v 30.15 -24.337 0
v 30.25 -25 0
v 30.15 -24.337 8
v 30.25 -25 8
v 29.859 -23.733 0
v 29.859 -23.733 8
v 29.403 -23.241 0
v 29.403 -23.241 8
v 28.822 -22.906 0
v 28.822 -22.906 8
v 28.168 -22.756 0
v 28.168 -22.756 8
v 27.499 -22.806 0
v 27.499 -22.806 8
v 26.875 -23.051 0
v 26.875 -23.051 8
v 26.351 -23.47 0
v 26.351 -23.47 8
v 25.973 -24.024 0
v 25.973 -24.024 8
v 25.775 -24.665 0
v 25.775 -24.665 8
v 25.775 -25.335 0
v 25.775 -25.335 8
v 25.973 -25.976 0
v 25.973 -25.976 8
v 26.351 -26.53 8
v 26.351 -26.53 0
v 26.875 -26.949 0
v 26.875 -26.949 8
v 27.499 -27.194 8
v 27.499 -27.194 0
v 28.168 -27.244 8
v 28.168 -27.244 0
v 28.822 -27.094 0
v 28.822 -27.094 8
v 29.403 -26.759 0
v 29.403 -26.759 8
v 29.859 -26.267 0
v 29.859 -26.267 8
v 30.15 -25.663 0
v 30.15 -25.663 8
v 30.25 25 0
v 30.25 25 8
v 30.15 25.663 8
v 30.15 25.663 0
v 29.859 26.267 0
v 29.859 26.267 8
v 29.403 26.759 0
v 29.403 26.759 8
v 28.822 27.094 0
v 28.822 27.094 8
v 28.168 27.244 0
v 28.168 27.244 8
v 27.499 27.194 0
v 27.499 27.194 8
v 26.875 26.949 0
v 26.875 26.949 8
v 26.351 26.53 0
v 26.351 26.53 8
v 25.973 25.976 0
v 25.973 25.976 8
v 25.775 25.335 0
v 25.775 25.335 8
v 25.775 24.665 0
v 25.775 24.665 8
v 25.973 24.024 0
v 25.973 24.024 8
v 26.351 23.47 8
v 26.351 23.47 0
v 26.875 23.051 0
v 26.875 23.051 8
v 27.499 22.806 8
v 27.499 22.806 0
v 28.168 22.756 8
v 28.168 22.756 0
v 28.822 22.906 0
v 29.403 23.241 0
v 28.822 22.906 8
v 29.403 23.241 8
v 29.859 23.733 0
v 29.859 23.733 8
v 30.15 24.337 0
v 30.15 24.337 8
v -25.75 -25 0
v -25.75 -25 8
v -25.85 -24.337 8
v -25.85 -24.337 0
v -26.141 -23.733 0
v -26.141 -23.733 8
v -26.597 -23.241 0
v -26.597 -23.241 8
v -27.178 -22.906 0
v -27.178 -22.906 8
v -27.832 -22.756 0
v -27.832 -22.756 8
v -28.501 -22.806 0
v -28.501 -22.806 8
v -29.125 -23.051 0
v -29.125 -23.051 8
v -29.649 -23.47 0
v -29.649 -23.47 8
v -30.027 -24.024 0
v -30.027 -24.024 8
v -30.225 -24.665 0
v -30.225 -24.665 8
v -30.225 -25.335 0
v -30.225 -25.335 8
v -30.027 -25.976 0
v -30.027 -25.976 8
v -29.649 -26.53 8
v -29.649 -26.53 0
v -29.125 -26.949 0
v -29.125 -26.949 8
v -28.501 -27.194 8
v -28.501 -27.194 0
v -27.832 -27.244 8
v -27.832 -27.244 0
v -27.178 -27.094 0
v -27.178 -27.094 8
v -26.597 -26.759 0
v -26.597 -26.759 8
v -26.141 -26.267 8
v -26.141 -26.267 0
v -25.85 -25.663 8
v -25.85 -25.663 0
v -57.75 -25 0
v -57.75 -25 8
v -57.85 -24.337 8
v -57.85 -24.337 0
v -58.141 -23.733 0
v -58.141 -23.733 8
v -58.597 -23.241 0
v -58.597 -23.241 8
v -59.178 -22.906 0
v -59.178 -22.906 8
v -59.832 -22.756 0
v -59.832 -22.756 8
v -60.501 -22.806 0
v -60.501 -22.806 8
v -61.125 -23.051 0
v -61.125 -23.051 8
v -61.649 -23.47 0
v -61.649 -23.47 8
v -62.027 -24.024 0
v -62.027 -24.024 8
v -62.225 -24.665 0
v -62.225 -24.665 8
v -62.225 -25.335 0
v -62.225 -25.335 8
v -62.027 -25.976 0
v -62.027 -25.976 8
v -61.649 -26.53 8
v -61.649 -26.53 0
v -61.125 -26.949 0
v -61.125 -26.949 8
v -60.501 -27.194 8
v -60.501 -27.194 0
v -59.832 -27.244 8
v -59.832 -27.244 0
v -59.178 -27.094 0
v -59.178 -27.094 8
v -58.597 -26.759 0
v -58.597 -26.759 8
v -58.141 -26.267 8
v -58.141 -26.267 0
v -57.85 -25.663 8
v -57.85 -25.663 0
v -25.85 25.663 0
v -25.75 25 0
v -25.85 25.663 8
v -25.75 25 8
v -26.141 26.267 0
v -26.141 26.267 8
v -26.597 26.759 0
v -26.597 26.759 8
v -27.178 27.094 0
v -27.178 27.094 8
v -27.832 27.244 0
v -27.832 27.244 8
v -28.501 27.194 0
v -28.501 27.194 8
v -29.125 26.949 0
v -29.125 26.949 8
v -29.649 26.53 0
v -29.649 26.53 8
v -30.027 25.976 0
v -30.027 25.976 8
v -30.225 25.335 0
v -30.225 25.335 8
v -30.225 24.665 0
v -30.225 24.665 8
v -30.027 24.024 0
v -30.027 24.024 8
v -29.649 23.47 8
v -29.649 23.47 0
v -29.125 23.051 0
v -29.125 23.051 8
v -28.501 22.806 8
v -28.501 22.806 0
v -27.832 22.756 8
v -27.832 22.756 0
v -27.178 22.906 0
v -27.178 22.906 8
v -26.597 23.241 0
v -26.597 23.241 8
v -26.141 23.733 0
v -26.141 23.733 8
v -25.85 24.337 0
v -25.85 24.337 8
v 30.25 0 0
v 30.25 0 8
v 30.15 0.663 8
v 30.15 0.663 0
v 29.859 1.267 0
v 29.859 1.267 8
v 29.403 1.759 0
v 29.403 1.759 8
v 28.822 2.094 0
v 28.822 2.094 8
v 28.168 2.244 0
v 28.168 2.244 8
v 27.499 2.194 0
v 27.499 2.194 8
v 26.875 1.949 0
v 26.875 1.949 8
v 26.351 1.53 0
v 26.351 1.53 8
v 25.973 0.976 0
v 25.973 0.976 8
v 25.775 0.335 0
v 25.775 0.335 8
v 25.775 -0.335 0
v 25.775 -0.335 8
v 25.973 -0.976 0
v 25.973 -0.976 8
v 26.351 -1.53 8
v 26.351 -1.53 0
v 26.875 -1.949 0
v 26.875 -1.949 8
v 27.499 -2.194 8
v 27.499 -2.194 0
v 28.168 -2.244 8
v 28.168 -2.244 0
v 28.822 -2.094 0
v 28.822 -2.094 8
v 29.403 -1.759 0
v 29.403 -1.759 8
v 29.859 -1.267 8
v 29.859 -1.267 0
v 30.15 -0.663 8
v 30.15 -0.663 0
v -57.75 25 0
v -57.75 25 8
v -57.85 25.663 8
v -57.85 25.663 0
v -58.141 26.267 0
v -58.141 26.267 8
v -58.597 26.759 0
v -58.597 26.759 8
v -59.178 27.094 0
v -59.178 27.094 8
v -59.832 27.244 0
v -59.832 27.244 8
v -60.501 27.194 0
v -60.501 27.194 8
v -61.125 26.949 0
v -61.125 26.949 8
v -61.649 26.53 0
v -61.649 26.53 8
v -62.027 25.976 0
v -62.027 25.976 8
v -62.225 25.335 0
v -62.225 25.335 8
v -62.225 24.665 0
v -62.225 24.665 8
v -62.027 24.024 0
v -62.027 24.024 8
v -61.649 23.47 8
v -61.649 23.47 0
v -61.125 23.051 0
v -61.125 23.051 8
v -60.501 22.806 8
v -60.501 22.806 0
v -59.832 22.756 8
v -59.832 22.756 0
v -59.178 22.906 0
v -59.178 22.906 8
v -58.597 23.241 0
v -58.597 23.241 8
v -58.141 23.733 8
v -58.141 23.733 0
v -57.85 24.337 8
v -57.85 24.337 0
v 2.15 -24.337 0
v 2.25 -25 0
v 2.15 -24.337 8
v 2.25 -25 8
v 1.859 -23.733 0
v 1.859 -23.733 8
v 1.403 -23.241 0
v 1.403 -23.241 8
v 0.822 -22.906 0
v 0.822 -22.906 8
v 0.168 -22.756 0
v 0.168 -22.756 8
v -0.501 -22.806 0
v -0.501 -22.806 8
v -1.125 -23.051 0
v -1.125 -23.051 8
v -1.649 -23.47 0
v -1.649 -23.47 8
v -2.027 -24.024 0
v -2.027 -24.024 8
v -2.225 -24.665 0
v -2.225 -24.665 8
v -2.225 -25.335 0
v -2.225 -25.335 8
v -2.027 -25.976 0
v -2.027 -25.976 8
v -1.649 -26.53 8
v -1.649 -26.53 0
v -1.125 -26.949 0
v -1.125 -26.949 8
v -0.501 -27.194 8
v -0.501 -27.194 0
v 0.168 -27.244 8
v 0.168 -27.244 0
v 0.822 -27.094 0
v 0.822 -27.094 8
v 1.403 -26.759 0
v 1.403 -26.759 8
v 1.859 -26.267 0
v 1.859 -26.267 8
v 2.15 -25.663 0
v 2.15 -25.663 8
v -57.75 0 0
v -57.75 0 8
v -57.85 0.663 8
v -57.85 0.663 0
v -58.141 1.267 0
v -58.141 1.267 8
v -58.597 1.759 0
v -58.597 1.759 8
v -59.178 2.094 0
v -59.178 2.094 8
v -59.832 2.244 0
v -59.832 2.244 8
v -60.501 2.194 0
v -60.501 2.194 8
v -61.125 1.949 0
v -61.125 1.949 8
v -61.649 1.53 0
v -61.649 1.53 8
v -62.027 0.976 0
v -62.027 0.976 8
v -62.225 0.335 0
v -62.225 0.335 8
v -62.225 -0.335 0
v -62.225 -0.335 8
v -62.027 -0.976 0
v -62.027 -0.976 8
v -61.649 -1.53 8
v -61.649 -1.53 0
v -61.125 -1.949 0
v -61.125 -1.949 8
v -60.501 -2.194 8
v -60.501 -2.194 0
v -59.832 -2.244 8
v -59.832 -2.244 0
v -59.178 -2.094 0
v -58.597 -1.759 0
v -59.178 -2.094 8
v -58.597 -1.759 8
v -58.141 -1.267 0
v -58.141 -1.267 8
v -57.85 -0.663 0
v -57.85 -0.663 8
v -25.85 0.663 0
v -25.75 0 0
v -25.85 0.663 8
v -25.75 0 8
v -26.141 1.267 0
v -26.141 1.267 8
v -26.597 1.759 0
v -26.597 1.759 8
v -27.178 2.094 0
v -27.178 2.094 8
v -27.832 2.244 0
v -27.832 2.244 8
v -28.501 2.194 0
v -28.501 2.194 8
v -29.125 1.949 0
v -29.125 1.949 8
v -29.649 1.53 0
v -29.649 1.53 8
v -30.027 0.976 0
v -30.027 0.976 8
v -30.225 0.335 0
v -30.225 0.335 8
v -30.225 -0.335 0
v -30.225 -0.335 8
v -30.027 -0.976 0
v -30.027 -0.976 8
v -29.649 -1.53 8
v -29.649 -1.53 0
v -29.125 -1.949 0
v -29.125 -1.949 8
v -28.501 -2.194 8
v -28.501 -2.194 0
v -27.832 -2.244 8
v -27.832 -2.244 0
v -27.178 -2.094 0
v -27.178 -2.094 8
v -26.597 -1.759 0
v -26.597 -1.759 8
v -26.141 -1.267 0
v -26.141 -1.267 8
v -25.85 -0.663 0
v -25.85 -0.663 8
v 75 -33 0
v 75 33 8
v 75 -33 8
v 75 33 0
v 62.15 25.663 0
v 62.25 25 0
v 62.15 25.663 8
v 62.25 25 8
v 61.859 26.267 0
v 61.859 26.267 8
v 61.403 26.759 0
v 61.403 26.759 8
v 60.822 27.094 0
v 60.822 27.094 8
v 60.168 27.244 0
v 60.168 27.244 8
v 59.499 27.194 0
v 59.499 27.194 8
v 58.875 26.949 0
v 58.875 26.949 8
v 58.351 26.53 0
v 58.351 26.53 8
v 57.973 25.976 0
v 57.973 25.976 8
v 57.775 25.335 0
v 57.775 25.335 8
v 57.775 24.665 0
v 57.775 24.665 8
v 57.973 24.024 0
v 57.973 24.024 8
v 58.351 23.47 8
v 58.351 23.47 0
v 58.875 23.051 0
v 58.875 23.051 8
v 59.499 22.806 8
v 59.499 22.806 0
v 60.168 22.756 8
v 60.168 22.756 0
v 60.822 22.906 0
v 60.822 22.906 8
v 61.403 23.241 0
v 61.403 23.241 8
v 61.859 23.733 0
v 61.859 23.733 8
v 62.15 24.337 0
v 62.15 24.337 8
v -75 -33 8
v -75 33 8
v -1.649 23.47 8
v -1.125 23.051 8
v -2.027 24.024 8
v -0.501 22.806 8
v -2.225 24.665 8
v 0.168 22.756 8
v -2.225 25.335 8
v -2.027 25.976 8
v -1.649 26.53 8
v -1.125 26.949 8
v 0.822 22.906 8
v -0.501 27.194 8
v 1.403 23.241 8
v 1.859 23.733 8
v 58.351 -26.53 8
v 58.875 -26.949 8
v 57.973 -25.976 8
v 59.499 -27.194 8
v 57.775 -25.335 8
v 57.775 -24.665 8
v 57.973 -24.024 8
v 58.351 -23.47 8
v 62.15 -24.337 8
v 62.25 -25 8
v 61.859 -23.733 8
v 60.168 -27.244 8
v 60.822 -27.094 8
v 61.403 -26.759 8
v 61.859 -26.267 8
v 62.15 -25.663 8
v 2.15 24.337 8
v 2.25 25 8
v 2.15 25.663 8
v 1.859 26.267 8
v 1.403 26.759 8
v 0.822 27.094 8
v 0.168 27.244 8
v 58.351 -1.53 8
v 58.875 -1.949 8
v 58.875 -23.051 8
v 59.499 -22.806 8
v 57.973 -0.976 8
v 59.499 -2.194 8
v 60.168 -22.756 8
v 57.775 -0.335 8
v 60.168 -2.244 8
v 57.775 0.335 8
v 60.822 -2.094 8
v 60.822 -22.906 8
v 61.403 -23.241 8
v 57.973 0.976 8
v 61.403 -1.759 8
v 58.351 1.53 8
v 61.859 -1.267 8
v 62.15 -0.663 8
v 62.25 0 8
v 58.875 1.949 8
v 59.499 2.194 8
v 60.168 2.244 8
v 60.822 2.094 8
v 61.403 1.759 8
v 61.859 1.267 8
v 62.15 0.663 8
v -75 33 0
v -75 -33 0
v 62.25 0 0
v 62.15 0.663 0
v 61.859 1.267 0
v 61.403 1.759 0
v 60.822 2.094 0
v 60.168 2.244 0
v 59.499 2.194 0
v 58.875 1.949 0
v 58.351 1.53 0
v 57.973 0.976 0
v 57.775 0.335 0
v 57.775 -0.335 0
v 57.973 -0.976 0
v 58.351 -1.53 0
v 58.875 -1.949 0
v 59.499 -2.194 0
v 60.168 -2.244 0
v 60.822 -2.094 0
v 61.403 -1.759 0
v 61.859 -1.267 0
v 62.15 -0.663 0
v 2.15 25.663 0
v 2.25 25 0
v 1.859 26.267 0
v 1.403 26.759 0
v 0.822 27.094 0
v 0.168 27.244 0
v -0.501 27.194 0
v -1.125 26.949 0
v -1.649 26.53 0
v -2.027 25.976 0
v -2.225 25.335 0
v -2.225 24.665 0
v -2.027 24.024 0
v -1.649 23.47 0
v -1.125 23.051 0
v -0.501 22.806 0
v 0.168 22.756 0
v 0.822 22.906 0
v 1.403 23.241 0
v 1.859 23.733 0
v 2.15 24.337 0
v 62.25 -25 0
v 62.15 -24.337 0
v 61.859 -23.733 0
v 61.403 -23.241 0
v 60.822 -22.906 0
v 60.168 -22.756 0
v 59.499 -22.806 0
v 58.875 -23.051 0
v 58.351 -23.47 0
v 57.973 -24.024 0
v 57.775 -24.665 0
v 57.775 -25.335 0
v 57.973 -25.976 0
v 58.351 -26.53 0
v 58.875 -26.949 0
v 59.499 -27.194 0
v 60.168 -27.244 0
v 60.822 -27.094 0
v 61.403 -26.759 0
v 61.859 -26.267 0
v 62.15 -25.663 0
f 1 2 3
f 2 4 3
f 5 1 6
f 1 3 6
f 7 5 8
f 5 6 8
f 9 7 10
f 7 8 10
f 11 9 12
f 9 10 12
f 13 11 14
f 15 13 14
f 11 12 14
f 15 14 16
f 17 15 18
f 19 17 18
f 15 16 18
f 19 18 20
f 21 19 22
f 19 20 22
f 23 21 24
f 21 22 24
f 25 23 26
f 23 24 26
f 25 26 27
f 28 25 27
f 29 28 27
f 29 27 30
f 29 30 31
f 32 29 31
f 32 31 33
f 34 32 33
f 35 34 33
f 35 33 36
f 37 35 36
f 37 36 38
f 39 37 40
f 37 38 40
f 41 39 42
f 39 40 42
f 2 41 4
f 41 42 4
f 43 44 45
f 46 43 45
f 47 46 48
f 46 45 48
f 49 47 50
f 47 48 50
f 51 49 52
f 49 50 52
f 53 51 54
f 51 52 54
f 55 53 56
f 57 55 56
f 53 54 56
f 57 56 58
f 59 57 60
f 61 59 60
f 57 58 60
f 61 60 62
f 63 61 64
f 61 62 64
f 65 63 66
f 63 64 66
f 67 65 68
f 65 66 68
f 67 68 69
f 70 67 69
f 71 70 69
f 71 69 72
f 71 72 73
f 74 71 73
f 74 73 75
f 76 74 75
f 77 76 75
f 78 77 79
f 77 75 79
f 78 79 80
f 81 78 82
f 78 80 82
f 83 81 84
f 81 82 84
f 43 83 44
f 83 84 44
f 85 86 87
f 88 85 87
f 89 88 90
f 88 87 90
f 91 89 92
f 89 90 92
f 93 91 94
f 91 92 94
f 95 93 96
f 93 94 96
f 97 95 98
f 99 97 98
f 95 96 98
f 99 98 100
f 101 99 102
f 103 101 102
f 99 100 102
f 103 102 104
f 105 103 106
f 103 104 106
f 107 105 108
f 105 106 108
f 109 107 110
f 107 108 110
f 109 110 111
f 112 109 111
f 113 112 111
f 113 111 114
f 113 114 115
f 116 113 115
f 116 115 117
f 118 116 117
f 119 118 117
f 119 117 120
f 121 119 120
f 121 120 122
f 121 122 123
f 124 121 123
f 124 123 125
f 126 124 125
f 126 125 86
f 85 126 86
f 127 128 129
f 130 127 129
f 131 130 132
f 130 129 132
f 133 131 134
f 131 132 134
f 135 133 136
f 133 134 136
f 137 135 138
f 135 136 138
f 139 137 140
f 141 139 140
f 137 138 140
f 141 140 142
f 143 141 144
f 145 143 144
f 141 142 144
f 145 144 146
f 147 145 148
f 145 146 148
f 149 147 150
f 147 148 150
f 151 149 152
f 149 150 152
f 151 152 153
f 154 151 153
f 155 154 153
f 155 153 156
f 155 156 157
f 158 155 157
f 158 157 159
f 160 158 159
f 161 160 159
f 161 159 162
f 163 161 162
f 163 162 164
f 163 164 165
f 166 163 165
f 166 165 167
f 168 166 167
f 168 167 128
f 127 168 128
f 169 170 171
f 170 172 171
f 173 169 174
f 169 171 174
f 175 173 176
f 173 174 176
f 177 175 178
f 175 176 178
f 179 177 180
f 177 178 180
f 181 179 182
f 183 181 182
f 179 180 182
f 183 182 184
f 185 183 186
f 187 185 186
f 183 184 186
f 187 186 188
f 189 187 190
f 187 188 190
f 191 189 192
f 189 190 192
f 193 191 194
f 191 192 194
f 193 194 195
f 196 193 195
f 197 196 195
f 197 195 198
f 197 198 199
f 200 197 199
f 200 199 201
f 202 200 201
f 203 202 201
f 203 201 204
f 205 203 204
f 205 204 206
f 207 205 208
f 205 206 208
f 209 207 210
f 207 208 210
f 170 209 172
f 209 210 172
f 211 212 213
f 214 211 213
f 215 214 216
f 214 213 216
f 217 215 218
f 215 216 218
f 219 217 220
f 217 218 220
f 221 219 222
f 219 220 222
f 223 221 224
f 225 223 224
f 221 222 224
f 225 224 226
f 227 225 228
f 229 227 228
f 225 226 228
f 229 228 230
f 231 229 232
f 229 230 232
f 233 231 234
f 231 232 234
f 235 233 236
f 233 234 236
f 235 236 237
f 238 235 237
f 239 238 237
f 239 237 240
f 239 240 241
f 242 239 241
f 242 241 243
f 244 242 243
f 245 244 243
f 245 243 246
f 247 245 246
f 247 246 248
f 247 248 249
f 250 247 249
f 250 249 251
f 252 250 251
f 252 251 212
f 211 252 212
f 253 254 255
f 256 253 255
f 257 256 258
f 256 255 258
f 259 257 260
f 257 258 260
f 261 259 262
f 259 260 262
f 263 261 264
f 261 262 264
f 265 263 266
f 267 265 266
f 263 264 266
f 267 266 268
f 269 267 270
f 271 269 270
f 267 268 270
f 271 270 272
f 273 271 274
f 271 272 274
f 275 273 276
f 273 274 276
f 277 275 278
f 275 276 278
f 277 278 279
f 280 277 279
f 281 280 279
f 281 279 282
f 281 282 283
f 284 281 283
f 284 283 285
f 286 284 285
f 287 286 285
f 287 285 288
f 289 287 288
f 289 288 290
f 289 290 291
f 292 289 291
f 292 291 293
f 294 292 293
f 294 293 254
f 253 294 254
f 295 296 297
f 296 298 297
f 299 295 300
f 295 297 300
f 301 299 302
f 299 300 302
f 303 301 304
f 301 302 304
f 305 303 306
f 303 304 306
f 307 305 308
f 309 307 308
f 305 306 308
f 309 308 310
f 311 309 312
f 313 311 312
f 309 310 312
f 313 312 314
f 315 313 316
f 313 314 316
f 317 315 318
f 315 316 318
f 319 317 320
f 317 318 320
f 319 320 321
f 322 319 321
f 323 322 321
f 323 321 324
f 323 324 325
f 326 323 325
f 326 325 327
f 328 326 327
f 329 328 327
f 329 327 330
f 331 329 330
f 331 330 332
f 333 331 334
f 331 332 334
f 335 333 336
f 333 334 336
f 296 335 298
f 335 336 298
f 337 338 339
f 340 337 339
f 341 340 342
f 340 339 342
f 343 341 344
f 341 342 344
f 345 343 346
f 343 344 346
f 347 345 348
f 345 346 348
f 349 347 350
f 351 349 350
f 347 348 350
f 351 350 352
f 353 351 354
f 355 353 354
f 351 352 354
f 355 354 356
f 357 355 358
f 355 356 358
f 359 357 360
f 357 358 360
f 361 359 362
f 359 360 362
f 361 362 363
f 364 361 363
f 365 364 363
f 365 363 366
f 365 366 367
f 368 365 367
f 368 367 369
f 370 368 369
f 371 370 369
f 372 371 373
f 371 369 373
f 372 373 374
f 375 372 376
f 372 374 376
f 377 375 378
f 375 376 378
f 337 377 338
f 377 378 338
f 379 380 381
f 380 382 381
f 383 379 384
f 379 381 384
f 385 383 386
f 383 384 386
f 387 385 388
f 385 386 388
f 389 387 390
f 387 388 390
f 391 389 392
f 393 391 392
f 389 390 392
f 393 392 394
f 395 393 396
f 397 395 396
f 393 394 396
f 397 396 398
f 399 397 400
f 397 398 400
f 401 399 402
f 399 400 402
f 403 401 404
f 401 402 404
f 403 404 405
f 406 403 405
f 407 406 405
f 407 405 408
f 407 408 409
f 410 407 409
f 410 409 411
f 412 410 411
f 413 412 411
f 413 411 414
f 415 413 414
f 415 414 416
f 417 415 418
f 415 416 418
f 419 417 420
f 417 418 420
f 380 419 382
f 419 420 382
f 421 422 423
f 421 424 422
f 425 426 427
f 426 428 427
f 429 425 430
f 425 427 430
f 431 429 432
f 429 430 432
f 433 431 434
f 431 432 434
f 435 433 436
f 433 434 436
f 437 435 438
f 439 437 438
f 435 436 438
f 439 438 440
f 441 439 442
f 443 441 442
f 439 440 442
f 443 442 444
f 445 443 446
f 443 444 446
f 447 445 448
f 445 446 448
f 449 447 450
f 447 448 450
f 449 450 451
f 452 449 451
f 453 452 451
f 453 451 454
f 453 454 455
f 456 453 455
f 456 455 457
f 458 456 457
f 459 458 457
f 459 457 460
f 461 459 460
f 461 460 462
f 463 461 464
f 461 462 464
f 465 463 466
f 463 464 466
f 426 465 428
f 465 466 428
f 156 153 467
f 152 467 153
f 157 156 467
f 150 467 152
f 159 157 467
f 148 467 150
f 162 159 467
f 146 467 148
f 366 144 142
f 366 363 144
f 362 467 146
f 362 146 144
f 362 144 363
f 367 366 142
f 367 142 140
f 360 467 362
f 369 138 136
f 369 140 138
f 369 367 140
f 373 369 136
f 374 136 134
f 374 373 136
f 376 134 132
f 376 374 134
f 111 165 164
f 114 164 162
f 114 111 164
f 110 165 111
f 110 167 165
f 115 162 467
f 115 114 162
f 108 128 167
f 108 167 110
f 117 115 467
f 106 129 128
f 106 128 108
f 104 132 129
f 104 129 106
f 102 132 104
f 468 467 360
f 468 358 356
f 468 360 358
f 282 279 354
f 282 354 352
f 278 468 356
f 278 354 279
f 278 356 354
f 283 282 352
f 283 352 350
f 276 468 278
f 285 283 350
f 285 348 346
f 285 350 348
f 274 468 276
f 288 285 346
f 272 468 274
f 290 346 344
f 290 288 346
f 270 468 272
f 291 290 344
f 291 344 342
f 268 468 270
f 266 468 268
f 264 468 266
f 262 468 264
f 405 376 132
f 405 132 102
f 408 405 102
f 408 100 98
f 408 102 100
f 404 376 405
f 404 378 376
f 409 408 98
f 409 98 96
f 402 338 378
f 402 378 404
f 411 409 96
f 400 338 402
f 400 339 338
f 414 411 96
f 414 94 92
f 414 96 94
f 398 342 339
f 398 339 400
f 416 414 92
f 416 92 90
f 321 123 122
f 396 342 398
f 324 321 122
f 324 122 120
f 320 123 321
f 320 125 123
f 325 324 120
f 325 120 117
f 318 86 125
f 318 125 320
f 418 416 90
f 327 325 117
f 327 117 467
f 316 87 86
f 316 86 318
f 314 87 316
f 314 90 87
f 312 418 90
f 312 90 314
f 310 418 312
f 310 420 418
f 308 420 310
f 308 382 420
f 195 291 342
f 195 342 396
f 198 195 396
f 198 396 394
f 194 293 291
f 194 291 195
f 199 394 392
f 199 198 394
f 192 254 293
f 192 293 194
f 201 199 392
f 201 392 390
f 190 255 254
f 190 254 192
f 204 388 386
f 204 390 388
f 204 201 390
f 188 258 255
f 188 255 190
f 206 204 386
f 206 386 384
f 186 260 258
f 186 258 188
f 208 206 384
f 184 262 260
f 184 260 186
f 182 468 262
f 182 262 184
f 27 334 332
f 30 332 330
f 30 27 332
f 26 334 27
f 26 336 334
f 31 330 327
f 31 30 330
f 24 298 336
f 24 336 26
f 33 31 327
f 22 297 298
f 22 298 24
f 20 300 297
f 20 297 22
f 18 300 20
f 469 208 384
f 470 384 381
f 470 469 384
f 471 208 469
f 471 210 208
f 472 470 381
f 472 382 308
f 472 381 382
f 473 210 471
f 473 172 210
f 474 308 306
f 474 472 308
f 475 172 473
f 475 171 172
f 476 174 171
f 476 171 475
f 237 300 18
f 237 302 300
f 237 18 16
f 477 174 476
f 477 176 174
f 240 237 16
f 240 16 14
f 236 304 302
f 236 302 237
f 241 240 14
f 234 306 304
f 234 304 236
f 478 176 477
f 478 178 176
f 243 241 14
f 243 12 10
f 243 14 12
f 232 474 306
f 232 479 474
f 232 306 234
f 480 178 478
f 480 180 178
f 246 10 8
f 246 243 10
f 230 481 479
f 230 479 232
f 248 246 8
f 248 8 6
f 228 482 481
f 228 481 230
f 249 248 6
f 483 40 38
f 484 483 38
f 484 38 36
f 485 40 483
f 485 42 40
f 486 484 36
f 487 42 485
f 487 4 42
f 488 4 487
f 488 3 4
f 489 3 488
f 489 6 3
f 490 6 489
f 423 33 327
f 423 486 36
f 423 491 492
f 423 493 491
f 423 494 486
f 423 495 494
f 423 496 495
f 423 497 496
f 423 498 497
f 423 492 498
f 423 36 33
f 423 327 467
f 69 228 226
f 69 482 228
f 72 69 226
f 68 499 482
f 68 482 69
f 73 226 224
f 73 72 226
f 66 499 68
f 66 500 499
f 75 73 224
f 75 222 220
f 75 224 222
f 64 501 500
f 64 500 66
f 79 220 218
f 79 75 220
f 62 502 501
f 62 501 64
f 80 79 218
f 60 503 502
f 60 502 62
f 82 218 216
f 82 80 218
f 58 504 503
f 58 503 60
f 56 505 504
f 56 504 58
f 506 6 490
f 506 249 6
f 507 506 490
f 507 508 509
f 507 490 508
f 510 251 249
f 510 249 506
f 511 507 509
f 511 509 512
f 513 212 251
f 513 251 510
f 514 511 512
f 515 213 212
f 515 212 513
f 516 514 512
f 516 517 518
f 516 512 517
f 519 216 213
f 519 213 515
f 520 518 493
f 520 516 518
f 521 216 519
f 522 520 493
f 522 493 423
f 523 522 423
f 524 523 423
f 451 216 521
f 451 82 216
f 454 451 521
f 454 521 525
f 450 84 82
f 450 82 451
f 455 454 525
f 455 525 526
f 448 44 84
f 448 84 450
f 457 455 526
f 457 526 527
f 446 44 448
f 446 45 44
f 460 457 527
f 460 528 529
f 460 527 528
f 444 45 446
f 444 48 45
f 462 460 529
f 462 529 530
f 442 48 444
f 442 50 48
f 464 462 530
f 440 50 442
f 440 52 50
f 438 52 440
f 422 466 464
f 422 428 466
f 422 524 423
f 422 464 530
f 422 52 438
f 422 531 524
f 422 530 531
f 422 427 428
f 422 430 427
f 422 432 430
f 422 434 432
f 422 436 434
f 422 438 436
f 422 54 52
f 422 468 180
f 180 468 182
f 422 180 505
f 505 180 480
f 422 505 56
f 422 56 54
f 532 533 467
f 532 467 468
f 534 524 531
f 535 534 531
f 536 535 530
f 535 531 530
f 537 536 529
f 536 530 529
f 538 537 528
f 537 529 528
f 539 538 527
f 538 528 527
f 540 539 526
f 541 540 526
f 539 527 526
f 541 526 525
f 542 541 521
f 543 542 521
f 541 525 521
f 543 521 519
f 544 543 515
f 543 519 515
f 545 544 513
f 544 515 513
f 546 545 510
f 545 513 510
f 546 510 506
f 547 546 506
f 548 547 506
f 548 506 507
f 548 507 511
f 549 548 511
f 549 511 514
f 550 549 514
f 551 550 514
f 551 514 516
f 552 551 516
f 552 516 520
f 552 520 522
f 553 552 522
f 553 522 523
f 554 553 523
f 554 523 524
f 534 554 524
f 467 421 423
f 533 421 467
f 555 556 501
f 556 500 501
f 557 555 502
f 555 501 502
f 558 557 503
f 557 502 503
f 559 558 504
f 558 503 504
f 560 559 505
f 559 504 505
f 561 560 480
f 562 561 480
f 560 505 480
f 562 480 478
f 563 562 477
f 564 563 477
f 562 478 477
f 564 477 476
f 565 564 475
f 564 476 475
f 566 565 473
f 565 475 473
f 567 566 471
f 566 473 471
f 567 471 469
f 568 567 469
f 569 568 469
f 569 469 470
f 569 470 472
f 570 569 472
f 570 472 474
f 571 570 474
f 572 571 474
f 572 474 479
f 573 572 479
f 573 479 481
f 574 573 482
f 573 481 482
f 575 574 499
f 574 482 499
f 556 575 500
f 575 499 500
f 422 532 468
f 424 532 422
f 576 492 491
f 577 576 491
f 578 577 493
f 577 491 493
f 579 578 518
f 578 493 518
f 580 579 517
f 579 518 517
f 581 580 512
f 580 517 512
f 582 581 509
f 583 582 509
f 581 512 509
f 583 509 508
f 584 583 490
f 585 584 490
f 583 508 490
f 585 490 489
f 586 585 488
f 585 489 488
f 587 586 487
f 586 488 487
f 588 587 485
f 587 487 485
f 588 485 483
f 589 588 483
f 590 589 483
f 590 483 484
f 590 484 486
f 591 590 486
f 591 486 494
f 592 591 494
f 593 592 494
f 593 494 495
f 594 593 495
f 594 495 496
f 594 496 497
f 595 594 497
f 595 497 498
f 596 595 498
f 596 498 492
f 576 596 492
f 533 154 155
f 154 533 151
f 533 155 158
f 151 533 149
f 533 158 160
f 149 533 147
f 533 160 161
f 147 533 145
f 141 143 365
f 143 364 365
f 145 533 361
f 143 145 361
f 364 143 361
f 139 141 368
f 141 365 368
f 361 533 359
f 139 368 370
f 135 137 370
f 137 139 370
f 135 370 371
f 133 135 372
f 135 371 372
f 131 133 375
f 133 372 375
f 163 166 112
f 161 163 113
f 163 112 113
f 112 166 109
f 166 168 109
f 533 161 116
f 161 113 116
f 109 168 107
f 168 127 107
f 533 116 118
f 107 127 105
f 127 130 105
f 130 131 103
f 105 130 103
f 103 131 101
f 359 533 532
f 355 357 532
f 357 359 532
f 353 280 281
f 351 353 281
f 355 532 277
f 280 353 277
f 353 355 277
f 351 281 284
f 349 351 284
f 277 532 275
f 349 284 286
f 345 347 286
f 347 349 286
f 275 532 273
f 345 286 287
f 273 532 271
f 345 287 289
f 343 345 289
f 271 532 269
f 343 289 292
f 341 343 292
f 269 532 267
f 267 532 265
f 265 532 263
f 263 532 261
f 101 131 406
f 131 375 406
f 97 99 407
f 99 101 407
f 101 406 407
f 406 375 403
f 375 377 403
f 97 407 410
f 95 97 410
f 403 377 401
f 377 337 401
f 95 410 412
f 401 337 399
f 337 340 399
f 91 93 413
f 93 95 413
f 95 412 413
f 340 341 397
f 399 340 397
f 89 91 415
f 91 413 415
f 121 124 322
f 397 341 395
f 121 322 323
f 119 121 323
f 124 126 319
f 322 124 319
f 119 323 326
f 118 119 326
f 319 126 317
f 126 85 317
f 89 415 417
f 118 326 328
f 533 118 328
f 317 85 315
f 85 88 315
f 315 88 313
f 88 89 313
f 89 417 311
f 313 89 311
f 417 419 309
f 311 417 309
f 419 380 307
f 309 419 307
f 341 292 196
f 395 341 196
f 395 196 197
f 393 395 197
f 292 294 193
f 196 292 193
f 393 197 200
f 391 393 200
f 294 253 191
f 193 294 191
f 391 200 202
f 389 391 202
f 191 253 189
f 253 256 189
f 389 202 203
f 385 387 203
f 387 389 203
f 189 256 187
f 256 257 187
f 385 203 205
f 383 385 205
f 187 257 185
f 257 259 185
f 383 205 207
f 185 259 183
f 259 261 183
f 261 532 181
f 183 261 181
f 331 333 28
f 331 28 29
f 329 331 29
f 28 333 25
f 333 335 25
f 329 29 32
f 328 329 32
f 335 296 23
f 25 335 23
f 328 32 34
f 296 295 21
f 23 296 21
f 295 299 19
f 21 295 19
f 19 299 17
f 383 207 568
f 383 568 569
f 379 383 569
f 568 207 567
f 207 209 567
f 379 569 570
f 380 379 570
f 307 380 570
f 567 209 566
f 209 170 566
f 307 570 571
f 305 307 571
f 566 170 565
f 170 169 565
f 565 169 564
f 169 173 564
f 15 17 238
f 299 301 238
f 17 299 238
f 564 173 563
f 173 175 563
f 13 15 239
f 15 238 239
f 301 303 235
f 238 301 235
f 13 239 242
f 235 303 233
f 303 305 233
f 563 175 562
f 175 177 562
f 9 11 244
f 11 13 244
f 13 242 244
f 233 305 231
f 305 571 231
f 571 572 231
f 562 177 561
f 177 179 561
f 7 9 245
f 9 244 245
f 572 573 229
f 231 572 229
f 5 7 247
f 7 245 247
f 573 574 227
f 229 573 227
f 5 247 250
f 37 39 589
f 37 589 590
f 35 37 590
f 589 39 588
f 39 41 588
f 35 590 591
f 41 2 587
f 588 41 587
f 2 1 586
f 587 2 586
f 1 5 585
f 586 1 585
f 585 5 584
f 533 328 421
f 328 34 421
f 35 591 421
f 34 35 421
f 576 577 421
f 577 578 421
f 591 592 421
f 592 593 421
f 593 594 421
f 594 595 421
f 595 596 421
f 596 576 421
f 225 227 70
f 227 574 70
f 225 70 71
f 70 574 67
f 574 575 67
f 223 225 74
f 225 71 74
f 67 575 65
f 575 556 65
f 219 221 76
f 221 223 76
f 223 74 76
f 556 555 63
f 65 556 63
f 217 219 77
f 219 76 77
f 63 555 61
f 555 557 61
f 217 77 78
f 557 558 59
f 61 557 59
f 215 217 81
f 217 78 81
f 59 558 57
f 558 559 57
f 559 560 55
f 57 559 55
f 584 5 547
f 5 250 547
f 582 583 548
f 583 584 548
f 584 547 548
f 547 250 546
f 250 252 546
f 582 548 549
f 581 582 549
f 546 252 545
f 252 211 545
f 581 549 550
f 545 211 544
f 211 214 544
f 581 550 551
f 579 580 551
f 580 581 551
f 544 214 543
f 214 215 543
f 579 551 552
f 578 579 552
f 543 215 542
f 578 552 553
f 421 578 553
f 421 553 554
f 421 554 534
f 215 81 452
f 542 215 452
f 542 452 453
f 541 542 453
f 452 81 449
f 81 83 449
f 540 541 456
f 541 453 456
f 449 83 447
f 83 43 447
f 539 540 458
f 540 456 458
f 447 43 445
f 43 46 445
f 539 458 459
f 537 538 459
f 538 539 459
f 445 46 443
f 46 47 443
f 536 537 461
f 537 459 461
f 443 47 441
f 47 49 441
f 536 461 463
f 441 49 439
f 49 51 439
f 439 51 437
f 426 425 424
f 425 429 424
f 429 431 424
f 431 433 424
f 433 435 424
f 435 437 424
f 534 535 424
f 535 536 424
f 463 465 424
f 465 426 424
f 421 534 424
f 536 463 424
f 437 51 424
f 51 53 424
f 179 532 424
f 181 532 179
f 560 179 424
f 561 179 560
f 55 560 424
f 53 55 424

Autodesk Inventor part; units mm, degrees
ref_plane "YZ Plane" through (0, 0, 0) normal (1, 0, 0) x (0, 1, 0)
ref_plane "XZ Plane" through (0, 0, 0) normal (0, 1, 0) x (-1, 0, 0)
ref_plane "XY Plane" through (0, 0, 0) normal (0, 0, 1) x (1, 0, 0)
sketch "Sketch1" plane through (0, 0, 0) normal (0, 0, 1) x (1, 0, 0)
  line L0 (-75, 33) -> (75, 33)
  line L1 (75, 33) -> (75, -33)
  line L2 (75, -33) -> (-75, -33)
  line L3 (-75, -33) -> (-75, 33)
  point P0 (0, 0)
  point P1 (0, 33)
  point P2 (-75, 0)
  dimension "d0" = 150
  dimension "d1" = 66
extrude "Extrusion1" add sketch "Sketch1" along normal blind 8
sketch "Sketch4" plane through (0, 0, 8) normal (0, 0, 1) x (1, 0, 0)
  circle A0 centre (-60, -25) radius 2.25
  circle A1 centre (-60, 25) radius 2.25
  line L0 (-75, 33) -> (-75, -33) projected
  line L1 (-75, -33) -> (75, -33) projected
  line L2 (75, 33) -> (-75, 33) projected
  circle A2 centre (-60, 0) radius 2.25
  circle A3 centre (-28, -25) radius 2.25
  circle A4 centre (-28, 0) radius 2.25
  circle A5 centre (-28, 25) radius 2.25
  circle A6 centre (60, -25) radius 2.25
  line L3 (75, -33) -> (75, 33) projected
  circle A7 centre (60, 0) radius 2.25
  circle A8 centre (60, 25) radius 2.25
  circle A9 centre (28, -25) radius 2.25
  circle A10 centre (28, 0) radius 2.25
  circle A11 centre (28, 25) radius 2.25
  circle A12 centre (0, -25) radius 2.25
  circle A13 centre (0, 25) radius 2.25
  point P0 (0, 0)
  point P1 (-75, 0)
  point P2 (-75, 0)
  dimension "d19" = 4.5
  dimension "d20" = 15
  dimension "d21" = 8
  dimension "d22" = 8
  dimension "d23" = 32
  dimension "d24" = 15
  dimension "d26" = 32
extrude "Extrusion4" cut sketch "Sketch4" against normal through all contours A0 | A1 | A2 | A3 | A4 | A5 | A6 | A7 | A8 | A9 | A10 | A11 | A12 | A13
equation "\"d22\" = d21"
equation "\"d24\" = d20"
equation "\"d26\" = d23"
properties part number "0005-10-022 fixare rulmenti"
